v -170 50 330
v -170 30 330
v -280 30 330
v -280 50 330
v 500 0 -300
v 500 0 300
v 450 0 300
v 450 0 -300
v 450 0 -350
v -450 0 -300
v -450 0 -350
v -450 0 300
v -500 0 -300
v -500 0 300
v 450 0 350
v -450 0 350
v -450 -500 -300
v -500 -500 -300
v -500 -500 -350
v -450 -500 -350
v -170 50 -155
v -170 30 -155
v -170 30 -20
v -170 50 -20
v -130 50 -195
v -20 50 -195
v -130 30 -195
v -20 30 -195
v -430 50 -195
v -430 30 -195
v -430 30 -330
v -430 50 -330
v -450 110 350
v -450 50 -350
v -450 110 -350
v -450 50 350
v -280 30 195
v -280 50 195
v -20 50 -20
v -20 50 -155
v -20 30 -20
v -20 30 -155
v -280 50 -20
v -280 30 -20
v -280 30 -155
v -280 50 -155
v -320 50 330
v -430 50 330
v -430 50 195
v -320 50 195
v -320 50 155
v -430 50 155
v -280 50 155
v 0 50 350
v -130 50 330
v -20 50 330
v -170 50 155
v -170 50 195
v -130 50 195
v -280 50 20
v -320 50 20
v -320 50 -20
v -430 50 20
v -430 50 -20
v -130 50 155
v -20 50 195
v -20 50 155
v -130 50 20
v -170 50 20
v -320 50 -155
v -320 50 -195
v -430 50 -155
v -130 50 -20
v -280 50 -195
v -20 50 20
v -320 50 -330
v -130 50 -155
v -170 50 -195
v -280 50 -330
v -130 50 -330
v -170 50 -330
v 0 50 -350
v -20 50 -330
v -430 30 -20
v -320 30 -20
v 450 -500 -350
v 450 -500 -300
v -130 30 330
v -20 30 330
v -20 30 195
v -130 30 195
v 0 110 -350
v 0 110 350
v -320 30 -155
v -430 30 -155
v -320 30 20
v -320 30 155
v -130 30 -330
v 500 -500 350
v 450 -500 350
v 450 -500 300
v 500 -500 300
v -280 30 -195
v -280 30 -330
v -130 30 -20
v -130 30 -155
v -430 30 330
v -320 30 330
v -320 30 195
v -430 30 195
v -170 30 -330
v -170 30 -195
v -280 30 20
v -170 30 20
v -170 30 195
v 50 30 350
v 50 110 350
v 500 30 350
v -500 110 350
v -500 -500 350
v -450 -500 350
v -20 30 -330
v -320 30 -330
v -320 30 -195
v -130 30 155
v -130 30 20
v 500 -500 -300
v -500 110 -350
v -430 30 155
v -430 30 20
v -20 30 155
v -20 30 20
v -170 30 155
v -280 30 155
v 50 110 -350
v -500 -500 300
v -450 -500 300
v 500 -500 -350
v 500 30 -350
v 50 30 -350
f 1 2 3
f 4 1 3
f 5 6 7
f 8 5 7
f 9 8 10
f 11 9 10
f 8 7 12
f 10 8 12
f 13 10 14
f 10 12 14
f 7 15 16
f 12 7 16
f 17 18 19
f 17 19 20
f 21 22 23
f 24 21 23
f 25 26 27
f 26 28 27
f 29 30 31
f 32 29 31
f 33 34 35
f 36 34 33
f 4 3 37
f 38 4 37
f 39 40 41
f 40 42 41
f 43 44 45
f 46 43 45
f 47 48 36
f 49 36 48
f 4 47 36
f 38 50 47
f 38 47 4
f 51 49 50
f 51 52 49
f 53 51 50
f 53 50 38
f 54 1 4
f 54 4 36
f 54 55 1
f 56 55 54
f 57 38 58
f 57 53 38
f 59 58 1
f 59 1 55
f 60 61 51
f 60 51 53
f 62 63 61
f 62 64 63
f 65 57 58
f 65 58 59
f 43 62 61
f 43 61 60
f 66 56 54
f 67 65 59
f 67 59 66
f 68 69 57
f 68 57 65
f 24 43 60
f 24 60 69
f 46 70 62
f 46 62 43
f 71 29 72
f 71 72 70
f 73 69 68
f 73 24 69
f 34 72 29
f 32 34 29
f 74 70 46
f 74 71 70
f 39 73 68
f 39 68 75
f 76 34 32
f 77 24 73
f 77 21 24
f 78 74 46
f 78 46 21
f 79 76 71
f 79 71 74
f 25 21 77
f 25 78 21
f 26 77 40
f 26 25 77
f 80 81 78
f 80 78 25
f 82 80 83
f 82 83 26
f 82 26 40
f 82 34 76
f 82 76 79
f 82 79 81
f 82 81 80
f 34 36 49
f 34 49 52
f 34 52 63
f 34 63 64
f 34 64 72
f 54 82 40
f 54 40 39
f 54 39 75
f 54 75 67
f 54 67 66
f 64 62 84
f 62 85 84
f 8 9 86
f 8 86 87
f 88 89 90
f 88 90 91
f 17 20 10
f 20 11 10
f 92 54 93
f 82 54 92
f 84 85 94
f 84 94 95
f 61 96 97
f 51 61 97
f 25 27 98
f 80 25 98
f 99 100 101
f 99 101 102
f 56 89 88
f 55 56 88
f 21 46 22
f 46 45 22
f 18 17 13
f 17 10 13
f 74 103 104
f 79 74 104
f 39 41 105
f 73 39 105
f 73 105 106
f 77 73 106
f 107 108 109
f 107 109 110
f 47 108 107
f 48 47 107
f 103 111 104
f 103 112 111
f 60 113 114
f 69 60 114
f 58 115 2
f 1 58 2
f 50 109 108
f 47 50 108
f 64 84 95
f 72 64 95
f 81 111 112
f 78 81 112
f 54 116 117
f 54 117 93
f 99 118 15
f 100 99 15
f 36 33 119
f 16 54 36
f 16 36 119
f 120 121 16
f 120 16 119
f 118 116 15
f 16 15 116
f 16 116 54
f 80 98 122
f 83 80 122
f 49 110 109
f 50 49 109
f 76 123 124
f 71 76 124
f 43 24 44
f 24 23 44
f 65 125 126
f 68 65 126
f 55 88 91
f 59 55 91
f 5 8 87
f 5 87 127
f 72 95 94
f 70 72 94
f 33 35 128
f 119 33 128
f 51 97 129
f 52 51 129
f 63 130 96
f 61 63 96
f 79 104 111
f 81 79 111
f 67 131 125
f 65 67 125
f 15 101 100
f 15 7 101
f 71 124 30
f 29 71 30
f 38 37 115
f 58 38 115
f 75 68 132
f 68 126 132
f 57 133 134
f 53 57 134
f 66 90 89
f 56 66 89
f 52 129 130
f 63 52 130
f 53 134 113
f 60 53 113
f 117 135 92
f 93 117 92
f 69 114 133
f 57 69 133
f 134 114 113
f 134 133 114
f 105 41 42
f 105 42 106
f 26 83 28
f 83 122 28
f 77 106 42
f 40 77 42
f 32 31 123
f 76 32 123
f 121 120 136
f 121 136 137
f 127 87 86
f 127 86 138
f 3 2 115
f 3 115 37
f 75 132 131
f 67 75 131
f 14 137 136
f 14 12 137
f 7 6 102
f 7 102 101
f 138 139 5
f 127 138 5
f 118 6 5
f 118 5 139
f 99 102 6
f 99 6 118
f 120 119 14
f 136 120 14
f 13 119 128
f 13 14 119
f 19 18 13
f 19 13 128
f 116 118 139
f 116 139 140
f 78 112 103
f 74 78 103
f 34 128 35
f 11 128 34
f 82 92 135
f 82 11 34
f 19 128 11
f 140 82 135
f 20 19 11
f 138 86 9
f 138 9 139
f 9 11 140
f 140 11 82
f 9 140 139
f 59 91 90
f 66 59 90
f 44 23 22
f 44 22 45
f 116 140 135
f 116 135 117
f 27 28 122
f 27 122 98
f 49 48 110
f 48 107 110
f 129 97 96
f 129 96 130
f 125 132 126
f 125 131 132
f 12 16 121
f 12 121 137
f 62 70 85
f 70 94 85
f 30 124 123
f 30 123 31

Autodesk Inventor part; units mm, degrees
ref_plane "YZ Plane" through (0, 0, 0) normal (1, 0, 0) x (0, 1, 0)
ref_plane "XZ Plane" through (0, 0, 0) normal (0, 1, 0) x (-1, 0, 0)
ref_plane "XY Plane" through (0, 0, 0) normal (0, 0, 1) x (1, 0, 0)
sketch "Sketch1" plane through (0, 0, 0) normal (0, 1, 0) x (-1, 0, 0)
  line L0 (-500, 350) -> (500, 350)
  line L1 (500, 350) -> (500, -350)
  line L2 (500, -350) -> (-500, -350)
  line L3 (-500, -350) -> (-500, 350)
  line L4 (-500, 350) -> (500, -350) construction
  line L5 (500, 350) -> (-500, -350) construction
  line L6 (500, -350) -> (-50, -350)
  line L7 (-50, -350) -> (-50, 350)
  line L8 (-50, 350) -> (500, 350)
  line L9 (500, 350) -> (500, -350)
  line L10 (500, -350) -> (450, -350)
  line L11 (450, -350) -> (450, 350)
  line L12 (450, 350) -> (500, 350)
  line L13 (500, 350) -> (500, -350)
  line L14 (0, -350) -> (-50, -350)
  line L15 (-50, -350) -> (-50, 350)
  line L16 (-50, 350) -> (0, 350)
  line L17 (0, 350) -> (0, -350)
  point P0 (0, 0)
  point P1 (450, 350)
  dimension "d0" = 1000
  dimension "d1" = 700
  dimension "d2" = 550
  dimension "d3" = 50
  dimension "d4" = 50
extrude "Extrusion1" add sketch "Sketch1" along normal blind 110 contours L0 L17 L2 L7 | L0 L1 L2 L11
extrude "Extrusion2" add sketch "Sketch1" along normal blind 30 contours L0 L7 L2 L3 | L0 L11 L2 L17
sketch "Sketch2" plane through (0, 0, 0) normal (0, -1, 0) x (1, 0, 0)
  line L0 (500, -350) -> (50, -350) projected
  line L1 (500, -350) -> (450, -350)
  line L2 (450, -350) -> (450, -300)
  line L3 (450, -300) -> (500, -300)
  line L4 (500, -300) -> (500, -350)
  line L5 (50, 350) -> (500, 350) projected
  line L6 (500, 300) -> (450, 300)
  line L7 (450, 300) -> (450, 350)
  line L8 (450, 350) -> (500, 350)
  line L9 (500, 350) -> (500, 300)
  line L10 (-500, -350) -> (-500, 350) projected
  line L11 (-500, -350) -> (-450, -350)
  line L12 (-450, -350) -> (-450, -300)
  line L13 (-450, -300) -> (-500, -300)
  line L14 (-500, -300) -> (-500, -350)
  line L15 (-500, 350) -> (-450, 350)
  line L16 (-450, 350) -> (-450, 300)
  line L17 (-450, 300) -> (-500, 300)
  line L18 (-500, 300) -> (-500, 350)
  point P0 (0, 0)
  dimension "d9" = 50
  dimension "d10" = 50
  dimension "d11" = 50
  dimension "d12" = 50
  dimension "d13" = 50
  dimension "d14" = 50
  dimension "d15" = 50
  dimension "d16" = 50
extrude "Extrusion3" add sketch "Sketch2" along normal blind 500
sketch "Sketch3" plane through (0, 30, 0) normal (0, 1, 0) x (1, 0, 0)
  line L0 (-450, -350) -> (-450, 350) projected
  line L1 (-450, 350) -> (-300, 350)
  line L2 (-300, 350) -> (-300, -350)
  line L3 (-300, -350) -> (-150, -350)
  line L4 (-150, -350) -> (-150, 350)
  line L5 (-150, 350) -> (0, 350)
  line L6 (0, 350) -> (0, -350) projected
  line L7 (0, 350) -> (0, -350)
  line L8 (0, -350) -> (-450, -350)
  line L9 (-450, -350) -> (-450, 350)
  line L10 (-150, 350) -> (-300, 350)
  line L11 (-450, 175) -> (0, 175)
  line L12 (-450, 0) -> (0, 0)
  line L13 (0, 350) -> (-450, 350) projected
  line L14 (-450, -175) -> (0, -175)
  line L15 (-430, 330) -> (-320, 330)
  line L16 (-320, 330) -> (-320, 195)
  line L17 (-320, 195) -> (-430, 195)
  line L18 (-430, 195) -> (-430, 330)
  line L19 (-280, 330) -> (-170, 330)
  line L20 (-170, 330) -> (-170, 195)
  line L21 (-170, 195) -> (-280, 195)
  line L22 (-280, 195) -> (-280, 330)
  line L23 (-130, 330) -> (-20, 330)
  line L24 (-20, 330) -> (-20, 195)
  line L25 (-20, 195) -> (-130, 195)
  line L26 (-130, 195) -> (-130, 330)
  line L27 (-430, 155) -> (-320, 155)
  line L28 (-320, 155) -> (-320, 20)
  line L29 (-320, 20) -> (-430, 20)
  line L30 (-430, 20) -> (-430, 155)
  line L31 (-280, 155) -> (-170, 155)
  line L32 (-170, 155) -> (-170, 20)
  line L33 (-170, 20) -> (-280, 20)
  line L34 (-280, 20) -> (-280, 155)
  line L35 (-130, 155) -> (-20, 155)
  line L36 (-20, 155) -> (-20, 20)
  line L37 (-20, 20) -> (-130, 20)
  line L38 (-130, 20) -> (-130, 155)
  line L39 (-430, -20) -> (-320, -20)
  line L40 (-320, -20) -> (-320, -155)
  line L41 (-320, -155) -> (-430, -155)
  line L42 (-430, -155) -> (-430, -20)
  line L43 (-280, -20) -> (-170, -20)
  line L44 (-170, -20) -> (-170, -155)
  line L45 (-170, -155) -> (-280, -155)
  line L46 (-280, -155) -> (-280, -20)
  line L47 (-130, -20) -> (-20, -20)
  line L48 (-20, -20) -> (-20, -155)
  line L49 (-20, -155) -> (-130, -155)
  line L50 (-130, -155) -> (-130, -20)
  line L51 (-430, -195) -> (-320, -195)
  line L52 (-320, -195) -> (-320, -330)
  line L53 (-320, -330) -> (-430, -330)
  line L54 (-430, -330) -> (-430, -195)
  line L55 (-280, -195) -> (-170, -195)
  line L56 (-170, -195) -> (-170, -330)
  line L57 (-170, -330) -> (-280, -330)
  line L58 (-280, -330) -> (-280, -195)
  line L59 (-130, -195) -> (-20, -195)
  line L60 (-20, -195) -> (-20, -330)
  line L61 (-20, -330) -> (-130, -330)
  line L62 (-130, -330) -> (-130, -195)
  point P0 (0, 0)
  point P1 (-280, 87.5)
  point P2 (-225, 20)
  point P3 (-225, -195)
  dimension "d19" = 150
  dimension "d20" = 150
  dimension "d21" = 150
  dimension "d22" = 0
  dimension "d23" = 700
  dimension "d24" = 175
  dimension "d25" = 175
  dimension "d26" = 175
  dimension "d27" = 175
  dimension "d28" = 20
  dimension "d29" = 20
  dimension "d30" = 20
  dimension "d31" = 20
  dimension "d32" = 20
  dimension "d33" = 20
  dimension "d34" = 20
  dimension "d35" = 20
  dimension "d36" = 110
  dimension "d37" = 110
  dimension "d38" = 20
  dimension "d39" = 20
  dimension "d40" = 20
  dimension "d41" = 20
  dimension "d42" = 20
  dimension "d43" = 20
  dimension "d44" = 20
  dimension "d45" = 20
  dimension "d46" = 20
  dimension "d47" = 20
  dimension "d48" = 20
  dimension "d49" = 20
extrude "Extrusion4" add sketch "Sketch3" along normal blind 20
properties part number "Table_2"
